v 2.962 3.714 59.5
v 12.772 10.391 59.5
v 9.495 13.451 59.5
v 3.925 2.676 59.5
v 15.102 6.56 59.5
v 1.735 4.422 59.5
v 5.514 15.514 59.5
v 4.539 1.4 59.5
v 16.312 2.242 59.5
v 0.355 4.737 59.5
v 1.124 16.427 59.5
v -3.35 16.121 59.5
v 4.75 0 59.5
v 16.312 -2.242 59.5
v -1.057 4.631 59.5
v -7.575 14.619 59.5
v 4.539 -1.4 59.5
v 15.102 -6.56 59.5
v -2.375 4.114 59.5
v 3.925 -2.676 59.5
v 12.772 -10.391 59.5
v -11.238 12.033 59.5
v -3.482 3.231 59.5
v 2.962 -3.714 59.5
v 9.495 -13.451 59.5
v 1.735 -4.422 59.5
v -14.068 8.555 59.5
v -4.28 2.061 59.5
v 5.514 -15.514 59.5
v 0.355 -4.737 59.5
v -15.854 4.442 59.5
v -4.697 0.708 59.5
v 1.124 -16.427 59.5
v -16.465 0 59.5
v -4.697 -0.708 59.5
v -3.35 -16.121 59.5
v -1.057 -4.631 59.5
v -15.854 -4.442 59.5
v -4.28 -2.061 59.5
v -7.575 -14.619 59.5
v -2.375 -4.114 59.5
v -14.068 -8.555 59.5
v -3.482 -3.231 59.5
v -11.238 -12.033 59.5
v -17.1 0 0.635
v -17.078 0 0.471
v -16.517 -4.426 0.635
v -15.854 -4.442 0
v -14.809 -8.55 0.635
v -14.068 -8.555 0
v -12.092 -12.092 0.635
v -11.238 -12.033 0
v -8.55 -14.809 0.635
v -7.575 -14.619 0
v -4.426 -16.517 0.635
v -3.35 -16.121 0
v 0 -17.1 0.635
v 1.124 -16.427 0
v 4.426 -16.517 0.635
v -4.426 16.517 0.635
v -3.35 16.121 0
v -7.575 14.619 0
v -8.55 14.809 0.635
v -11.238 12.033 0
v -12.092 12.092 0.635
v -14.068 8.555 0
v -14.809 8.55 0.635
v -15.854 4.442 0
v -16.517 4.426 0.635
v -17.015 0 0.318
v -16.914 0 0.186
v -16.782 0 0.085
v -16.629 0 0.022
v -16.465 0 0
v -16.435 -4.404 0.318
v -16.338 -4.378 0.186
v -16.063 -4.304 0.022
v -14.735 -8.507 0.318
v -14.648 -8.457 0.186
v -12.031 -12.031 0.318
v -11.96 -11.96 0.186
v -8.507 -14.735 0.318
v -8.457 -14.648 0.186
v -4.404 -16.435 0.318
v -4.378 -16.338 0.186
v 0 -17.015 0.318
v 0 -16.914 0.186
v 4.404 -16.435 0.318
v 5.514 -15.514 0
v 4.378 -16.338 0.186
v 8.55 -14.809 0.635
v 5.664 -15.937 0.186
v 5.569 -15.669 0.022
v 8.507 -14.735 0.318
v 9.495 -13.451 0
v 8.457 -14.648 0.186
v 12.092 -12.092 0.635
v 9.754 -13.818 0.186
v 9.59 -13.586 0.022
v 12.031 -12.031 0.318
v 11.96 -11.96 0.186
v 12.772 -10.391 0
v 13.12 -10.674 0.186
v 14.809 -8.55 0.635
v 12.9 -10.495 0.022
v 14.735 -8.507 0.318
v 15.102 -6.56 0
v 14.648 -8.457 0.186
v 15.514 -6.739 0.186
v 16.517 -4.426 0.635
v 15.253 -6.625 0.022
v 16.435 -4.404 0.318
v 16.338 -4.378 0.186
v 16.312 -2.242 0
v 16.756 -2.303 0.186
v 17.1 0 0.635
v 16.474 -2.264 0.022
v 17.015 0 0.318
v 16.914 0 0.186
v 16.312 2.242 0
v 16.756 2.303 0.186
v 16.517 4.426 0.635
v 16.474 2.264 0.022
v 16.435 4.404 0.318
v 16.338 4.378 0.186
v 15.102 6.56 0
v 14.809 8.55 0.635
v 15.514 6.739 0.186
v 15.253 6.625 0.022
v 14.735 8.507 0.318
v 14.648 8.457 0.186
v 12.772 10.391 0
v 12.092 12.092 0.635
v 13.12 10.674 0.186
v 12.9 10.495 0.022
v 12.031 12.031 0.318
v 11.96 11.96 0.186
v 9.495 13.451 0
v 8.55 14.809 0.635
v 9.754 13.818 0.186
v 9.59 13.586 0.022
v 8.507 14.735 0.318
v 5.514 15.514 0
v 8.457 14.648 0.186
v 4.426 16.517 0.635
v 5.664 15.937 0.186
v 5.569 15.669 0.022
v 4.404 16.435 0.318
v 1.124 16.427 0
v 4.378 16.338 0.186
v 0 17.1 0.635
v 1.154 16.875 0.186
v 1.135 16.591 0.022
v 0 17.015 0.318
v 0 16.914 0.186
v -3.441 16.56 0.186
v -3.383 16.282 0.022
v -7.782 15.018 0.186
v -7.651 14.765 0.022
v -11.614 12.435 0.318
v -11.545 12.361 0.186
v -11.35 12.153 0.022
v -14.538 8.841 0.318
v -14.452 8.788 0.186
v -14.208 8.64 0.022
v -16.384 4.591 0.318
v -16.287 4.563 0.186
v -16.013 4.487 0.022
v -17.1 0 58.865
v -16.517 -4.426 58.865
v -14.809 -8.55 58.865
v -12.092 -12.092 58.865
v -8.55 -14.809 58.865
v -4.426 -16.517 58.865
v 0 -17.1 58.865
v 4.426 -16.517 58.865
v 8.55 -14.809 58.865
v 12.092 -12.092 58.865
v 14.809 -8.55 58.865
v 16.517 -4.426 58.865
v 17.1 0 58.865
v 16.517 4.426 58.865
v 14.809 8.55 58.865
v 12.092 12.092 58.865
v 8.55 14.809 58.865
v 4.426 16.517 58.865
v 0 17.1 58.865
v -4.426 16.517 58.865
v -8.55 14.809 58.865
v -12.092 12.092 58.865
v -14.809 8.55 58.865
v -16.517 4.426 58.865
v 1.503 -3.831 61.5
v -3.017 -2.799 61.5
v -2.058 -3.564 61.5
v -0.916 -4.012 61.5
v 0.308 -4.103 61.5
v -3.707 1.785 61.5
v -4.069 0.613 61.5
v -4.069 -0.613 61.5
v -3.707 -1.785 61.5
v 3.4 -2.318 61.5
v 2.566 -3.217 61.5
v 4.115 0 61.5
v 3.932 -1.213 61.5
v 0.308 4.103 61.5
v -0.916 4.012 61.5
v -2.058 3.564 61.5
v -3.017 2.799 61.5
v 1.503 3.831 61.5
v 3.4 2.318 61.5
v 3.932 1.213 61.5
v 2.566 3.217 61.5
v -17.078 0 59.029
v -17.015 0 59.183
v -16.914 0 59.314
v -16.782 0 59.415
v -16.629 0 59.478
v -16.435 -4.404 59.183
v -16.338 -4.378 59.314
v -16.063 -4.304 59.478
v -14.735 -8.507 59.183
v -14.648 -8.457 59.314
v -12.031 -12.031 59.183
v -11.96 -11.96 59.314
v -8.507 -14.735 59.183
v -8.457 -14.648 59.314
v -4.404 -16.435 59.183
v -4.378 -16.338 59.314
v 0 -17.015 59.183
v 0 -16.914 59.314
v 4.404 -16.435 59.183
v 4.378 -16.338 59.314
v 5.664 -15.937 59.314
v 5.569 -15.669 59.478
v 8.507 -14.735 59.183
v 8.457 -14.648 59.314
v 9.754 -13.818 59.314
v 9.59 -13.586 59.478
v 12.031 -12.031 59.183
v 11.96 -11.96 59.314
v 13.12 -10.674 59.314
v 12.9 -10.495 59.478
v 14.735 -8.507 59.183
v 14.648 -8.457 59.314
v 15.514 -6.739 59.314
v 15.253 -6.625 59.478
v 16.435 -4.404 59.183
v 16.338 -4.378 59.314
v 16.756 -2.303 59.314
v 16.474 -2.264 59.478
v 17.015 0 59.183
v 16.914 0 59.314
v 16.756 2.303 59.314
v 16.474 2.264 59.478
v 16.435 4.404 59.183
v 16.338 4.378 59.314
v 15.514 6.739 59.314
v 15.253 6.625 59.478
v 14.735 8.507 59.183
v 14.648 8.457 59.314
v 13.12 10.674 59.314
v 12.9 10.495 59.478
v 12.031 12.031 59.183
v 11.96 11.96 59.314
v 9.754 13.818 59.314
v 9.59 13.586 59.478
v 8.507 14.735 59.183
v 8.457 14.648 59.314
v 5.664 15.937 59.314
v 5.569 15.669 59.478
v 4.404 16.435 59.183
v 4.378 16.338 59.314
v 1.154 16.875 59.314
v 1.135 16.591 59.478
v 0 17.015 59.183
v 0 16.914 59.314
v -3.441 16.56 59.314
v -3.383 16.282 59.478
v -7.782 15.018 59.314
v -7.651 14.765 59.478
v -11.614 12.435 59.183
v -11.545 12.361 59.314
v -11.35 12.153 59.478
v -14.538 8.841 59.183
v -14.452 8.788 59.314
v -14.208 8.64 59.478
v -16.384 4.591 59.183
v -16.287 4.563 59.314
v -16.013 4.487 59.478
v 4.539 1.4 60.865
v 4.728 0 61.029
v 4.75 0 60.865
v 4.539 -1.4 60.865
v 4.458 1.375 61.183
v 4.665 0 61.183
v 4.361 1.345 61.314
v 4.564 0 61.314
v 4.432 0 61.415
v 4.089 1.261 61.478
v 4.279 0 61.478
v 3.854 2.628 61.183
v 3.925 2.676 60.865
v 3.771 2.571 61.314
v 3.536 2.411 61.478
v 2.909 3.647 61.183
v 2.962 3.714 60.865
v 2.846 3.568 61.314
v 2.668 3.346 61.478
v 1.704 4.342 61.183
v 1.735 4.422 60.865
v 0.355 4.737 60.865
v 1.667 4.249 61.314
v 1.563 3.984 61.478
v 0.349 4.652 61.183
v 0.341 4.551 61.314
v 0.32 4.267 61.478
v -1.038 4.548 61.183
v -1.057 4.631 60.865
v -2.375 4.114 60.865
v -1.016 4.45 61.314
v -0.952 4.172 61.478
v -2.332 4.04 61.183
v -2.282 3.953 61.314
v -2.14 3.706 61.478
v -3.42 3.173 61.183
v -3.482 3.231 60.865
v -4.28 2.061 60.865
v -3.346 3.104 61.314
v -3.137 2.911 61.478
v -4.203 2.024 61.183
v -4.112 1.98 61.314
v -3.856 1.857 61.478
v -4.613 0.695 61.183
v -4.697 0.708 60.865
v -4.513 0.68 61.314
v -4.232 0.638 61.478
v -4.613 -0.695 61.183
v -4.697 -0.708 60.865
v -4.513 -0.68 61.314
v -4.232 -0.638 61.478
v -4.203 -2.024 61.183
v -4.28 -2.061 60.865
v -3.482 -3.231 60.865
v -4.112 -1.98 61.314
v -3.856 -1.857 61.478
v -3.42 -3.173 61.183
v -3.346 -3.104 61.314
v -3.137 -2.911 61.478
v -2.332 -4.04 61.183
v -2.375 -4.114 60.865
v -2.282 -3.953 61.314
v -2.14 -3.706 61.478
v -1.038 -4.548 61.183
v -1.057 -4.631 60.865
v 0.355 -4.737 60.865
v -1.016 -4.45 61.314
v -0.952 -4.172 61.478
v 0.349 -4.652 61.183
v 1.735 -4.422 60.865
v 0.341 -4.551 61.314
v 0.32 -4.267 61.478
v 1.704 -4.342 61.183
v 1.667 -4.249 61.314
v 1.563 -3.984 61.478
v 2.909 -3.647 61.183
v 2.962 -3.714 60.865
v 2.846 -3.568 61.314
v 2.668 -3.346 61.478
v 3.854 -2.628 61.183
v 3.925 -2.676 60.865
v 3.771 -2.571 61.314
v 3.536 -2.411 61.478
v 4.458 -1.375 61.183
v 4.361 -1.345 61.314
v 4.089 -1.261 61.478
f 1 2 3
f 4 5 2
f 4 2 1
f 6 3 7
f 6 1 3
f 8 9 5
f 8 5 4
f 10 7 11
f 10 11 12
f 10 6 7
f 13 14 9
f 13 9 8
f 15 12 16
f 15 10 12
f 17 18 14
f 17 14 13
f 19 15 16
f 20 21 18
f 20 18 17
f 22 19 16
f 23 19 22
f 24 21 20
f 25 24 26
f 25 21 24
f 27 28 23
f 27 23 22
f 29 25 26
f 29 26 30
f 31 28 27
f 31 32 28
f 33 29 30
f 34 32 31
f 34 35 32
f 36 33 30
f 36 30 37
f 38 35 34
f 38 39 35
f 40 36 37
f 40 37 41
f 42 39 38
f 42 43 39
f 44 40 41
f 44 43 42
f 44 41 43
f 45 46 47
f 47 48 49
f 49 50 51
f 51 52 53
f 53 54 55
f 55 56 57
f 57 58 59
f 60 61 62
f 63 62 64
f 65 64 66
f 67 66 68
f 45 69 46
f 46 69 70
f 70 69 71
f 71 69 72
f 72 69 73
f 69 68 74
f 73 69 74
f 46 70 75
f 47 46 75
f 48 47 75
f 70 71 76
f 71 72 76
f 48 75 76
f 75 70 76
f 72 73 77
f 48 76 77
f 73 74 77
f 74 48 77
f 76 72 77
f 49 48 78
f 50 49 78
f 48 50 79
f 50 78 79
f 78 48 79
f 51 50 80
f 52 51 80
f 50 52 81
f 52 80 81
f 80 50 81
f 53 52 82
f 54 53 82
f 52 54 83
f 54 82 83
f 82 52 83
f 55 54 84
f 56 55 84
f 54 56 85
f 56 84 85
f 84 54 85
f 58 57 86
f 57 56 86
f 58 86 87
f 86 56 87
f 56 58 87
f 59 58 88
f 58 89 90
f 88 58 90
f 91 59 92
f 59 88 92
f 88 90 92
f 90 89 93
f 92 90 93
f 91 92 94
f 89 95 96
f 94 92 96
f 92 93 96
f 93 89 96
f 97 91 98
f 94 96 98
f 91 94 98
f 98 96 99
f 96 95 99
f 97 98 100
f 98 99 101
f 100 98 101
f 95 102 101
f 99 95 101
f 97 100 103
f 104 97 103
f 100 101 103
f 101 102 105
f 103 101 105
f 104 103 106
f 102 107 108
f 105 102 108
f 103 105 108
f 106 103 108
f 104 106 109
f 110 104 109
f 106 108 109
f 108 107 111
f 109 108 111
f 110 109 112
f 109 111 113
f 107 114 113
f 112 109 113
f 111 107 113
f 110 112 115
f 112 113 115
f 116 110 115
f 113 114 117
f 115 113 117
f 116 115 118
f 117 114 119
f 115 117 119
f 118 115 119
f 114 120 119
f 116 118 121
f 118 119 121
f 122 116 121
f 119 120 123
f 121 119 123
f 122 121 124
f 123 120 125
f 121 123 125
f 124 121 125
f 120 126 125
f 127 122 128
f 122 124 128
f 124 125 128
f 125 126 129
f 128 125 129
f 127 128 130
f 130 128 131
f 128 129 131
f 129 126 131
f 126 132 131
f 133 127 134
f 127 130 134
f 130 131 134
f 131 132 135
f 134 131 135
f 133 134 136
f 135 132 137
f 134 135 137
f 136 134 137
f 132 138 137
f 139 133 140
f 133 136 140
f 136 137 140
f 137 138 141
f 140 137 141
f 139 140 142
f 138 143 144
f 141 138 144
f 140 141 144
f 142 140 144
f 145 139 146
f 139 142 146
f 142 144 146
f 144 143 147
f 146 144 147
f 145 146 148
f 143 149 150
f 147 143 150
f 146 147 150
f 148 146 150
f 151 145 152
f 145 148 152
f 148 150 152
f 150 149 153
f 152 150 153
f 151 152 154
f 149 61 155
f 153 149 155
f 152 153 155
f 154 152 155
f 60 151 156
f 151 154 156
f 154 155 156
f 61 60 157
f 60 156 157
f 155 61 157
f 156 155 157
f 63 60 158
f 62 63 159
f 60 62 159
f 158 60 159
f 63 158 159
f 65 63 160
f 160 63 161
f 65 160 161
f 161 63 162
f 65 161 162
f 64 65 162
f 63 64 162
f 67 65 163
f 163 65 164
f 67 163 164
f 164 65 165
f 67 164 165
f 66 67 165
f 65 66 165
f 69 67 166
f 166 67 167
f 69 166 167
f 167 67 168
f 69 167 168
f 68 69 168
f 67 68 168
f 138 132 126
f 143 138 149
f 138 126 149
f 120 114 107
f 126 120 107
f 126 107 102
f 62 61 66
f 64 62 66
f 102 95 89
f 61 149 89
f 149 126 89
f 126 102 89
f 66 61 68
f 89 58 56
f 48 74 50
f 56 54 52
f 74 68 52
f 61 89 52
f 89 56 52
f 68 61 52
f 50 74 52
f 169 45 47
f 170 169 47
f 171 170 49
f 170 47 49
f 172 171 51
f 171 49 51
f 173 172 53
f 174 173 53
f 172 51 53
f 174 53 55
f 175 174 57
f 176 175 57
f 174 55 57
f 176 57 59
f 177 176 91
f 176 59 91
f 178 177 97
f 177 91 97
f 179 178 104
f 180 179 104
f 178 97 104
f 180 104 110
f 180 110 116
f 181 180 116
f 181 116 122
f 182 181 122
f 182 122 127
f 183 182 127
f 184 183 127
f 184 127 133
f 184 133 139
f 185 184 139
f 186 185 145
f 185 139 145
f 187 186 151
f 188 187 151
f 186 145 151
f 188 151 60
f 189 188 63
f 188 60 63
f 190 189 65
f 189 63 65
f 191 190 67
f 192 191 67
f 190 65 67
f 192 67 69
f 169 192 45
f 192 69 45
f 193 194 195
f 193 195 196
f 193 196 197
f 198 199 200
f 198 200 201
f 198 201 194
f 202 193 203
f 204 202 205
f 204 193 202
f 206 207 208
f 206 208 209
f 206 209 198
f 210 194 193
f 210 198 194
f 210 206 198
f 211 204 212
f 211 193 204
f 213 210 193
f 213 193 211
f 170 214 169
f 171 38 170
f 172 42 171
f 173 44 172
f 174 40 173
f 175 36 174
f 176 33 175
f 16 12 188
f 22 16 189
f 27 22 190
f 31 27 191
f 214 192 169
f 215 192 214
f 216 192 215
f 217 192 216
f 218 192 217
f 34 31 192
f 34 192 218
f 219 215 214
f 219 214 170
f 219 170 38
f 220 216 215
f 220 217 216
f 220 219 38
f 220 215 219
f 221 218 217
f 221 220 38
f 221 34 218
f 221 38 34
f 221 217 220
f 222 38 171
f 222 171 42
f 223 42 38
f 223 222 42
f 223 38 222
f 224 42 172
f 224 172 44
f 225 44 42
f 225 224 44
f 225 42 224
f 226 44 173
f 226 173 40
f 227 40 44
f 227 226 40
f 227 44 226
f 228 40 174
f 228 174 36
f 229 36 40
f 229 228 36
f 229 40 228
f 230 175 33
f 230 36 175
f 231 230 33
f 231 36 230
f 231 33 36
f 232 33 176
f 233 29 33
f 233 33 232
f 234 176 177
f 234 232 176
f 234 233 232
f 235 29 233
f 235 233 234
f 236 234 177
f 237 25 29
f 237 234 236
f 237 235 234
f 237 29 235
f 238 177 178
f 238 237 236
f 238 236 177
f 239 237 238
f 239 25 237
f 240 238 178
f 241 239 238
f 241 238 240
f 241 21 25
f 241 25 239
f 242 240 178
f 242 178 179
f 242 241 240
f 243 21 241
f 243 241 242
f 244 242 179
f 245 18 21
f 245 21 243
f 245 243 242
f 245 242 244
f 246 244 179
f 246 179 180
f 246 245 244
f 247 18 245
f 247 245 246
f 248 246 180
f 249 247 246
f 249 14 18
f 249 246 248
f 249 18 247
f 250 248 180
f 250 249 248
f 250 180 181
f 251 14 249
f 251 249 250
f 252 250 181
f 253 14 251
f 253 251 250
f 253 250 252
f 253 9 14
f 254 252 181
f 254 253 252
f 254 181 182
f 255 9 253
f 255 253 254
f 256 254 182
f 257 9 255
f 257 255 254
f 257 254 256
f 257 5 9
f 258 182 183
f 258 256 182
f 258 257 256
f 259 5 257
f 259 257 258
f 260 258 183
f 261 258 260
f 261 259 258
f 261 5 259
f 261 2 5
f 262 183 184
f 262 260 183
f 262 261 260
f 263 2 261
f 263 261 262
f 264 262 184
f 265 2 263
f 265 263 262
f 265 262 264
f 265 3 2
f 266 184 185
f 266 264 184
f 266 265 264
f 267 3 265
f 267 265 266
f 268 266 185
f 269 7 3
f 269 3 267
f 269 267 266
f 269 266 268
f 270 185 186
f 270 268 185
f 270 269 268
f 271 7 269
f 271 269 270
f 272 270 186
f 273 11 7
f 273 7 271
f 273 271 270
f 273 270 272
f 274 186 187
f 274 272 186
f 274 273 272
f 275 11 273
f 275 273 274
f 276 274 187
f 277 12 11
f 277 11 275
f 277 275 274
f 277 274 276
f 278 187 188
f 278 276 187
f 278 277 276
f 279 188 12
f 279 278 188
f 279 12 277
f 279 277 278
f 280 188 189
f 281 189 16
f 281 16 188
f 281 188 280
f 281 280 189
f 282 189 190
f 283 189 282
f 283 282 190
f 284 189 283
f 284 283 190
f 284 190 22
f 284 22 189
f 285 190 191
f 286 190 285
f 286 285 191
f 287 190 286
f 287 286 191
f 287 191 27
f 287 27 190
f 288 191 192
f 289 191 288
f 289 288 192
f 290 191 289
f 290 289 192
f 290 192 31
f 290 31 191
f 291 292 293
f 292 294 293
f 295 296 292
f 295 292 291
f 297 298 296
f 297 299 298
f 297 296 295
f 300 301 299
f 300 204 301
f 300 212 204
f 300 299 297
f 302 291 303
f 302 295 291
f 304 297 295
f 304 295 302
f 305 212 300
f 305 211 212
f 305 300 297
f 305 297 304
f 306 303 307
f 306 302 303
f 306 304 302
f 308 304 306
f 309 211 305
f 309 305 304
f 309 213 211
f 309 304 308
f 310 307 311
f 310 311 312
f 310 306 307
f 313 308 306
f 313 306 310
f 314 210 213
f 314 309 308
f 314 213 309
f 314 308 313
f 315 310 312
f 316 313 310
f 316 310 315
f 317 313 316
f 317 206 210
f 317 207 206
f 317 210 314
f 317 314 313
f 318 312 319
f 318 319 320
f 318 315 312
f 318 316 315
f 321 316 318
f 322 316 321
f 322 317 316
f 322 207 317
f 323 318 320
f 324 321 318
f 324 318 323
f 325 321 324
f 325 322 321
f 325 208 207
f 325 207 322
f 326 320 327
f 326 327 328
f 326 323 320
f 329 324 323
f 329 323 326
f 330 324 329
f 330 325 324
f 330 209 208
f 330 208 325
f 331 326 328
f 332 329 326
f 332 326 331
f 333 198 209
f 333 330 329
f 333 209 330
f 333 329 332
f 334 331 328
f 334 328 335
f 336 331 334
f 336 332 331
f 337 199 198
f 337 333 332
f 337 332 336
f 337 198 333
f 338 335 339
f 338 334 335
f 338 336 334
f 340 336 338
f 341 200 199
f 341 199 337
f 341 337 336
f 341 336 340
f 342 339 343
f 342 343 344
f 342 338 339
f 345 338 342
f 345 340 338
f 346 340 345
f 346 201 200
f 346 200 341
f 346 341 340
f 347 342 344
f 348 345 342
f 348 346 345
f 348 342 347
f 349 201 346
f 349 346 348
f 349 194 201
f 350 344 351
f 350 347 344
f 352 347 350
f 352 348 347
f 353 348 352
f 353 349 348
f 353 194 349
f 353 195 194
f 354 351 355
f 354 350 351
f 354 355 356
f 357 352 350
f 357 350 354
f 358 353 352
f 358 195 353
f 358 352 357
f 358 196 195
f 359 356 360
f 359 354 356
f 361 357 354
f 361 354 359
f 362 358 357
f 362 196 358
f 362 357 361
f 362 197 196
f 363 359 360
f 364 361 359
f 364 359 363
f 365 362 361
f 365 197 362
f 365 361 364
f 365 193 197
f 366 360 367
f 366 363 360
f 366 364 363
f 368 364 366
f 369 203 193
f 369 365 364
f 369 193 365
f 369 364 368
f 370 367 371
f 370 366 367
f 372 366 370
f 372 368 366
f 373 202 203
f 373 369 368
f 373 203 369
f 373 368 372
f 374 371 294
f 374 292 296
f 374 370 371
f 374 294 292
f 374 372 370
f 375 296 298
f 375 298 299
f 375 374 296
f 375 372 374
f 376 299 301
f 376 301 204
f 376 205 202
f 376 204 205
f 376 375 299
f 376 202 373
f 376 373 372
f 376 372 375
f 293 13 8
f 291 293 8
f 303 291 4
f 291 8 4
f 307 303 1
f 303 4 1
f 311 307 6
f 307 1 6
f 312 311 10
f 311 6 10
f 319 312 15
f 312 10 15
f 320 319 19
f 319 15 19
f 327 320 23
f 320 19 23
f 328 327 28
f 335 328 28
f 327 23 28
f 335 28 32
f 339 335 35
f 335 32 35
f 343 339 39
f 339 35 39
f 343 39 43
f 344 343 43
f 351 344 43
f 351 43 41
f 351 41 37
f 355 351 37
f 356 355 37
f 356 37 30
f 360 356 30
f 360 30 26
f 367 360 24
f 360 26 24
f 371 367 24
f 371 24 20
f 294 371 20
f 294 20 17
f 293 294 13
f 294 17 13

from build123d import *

# Parameters (mm, degrees)
SKETCH1_R           = 17.1
BOSS_EXTRUDE1_DEPTH = 59.5
SKETCH2_R           = 4.75
BOSS_EXTRUDE2_DEPTH = 2
FILLET1_R           = 0.635
FILLET2_R           = 0.635


with BuildPart() as part:
    # Sketch1 → Boss-Extrude1 (new body)
    with BuildSketch(Plane.XY):
        with Locations(Location((0, 0, 0), (0, 0, 180))):
            Circle(SKETCH1_R)
    extrude(amount=BOSS_EXTRUDE1_DEPTH)

    # Sketch2 → Boss-Extrude2 (add)
    with BuildSketch(Plane.XY.offset(59.5)):
        Circle(SKETCH2_R)
    extrude(amount=BOSS_EXTRUDE2_DEPTH)

    # Fillet1
    fillet1_edges = [part.edges().sort_by_distance(p)[0] for p in [
        (17.1, 0, 59.5),
        (-4.75, 0, 61.5),
    ]]
    fillet(fillet1_edges, radius=FILLET1_R)

    # Fillet2
    fillet2_edges = [part.edges().sort_by_distance(p)[0] for p in [
        (17.1, 0, 0),
    ]]
    fillet(fillet2_edges, radius=FILLET2_R)


solid = part.part
